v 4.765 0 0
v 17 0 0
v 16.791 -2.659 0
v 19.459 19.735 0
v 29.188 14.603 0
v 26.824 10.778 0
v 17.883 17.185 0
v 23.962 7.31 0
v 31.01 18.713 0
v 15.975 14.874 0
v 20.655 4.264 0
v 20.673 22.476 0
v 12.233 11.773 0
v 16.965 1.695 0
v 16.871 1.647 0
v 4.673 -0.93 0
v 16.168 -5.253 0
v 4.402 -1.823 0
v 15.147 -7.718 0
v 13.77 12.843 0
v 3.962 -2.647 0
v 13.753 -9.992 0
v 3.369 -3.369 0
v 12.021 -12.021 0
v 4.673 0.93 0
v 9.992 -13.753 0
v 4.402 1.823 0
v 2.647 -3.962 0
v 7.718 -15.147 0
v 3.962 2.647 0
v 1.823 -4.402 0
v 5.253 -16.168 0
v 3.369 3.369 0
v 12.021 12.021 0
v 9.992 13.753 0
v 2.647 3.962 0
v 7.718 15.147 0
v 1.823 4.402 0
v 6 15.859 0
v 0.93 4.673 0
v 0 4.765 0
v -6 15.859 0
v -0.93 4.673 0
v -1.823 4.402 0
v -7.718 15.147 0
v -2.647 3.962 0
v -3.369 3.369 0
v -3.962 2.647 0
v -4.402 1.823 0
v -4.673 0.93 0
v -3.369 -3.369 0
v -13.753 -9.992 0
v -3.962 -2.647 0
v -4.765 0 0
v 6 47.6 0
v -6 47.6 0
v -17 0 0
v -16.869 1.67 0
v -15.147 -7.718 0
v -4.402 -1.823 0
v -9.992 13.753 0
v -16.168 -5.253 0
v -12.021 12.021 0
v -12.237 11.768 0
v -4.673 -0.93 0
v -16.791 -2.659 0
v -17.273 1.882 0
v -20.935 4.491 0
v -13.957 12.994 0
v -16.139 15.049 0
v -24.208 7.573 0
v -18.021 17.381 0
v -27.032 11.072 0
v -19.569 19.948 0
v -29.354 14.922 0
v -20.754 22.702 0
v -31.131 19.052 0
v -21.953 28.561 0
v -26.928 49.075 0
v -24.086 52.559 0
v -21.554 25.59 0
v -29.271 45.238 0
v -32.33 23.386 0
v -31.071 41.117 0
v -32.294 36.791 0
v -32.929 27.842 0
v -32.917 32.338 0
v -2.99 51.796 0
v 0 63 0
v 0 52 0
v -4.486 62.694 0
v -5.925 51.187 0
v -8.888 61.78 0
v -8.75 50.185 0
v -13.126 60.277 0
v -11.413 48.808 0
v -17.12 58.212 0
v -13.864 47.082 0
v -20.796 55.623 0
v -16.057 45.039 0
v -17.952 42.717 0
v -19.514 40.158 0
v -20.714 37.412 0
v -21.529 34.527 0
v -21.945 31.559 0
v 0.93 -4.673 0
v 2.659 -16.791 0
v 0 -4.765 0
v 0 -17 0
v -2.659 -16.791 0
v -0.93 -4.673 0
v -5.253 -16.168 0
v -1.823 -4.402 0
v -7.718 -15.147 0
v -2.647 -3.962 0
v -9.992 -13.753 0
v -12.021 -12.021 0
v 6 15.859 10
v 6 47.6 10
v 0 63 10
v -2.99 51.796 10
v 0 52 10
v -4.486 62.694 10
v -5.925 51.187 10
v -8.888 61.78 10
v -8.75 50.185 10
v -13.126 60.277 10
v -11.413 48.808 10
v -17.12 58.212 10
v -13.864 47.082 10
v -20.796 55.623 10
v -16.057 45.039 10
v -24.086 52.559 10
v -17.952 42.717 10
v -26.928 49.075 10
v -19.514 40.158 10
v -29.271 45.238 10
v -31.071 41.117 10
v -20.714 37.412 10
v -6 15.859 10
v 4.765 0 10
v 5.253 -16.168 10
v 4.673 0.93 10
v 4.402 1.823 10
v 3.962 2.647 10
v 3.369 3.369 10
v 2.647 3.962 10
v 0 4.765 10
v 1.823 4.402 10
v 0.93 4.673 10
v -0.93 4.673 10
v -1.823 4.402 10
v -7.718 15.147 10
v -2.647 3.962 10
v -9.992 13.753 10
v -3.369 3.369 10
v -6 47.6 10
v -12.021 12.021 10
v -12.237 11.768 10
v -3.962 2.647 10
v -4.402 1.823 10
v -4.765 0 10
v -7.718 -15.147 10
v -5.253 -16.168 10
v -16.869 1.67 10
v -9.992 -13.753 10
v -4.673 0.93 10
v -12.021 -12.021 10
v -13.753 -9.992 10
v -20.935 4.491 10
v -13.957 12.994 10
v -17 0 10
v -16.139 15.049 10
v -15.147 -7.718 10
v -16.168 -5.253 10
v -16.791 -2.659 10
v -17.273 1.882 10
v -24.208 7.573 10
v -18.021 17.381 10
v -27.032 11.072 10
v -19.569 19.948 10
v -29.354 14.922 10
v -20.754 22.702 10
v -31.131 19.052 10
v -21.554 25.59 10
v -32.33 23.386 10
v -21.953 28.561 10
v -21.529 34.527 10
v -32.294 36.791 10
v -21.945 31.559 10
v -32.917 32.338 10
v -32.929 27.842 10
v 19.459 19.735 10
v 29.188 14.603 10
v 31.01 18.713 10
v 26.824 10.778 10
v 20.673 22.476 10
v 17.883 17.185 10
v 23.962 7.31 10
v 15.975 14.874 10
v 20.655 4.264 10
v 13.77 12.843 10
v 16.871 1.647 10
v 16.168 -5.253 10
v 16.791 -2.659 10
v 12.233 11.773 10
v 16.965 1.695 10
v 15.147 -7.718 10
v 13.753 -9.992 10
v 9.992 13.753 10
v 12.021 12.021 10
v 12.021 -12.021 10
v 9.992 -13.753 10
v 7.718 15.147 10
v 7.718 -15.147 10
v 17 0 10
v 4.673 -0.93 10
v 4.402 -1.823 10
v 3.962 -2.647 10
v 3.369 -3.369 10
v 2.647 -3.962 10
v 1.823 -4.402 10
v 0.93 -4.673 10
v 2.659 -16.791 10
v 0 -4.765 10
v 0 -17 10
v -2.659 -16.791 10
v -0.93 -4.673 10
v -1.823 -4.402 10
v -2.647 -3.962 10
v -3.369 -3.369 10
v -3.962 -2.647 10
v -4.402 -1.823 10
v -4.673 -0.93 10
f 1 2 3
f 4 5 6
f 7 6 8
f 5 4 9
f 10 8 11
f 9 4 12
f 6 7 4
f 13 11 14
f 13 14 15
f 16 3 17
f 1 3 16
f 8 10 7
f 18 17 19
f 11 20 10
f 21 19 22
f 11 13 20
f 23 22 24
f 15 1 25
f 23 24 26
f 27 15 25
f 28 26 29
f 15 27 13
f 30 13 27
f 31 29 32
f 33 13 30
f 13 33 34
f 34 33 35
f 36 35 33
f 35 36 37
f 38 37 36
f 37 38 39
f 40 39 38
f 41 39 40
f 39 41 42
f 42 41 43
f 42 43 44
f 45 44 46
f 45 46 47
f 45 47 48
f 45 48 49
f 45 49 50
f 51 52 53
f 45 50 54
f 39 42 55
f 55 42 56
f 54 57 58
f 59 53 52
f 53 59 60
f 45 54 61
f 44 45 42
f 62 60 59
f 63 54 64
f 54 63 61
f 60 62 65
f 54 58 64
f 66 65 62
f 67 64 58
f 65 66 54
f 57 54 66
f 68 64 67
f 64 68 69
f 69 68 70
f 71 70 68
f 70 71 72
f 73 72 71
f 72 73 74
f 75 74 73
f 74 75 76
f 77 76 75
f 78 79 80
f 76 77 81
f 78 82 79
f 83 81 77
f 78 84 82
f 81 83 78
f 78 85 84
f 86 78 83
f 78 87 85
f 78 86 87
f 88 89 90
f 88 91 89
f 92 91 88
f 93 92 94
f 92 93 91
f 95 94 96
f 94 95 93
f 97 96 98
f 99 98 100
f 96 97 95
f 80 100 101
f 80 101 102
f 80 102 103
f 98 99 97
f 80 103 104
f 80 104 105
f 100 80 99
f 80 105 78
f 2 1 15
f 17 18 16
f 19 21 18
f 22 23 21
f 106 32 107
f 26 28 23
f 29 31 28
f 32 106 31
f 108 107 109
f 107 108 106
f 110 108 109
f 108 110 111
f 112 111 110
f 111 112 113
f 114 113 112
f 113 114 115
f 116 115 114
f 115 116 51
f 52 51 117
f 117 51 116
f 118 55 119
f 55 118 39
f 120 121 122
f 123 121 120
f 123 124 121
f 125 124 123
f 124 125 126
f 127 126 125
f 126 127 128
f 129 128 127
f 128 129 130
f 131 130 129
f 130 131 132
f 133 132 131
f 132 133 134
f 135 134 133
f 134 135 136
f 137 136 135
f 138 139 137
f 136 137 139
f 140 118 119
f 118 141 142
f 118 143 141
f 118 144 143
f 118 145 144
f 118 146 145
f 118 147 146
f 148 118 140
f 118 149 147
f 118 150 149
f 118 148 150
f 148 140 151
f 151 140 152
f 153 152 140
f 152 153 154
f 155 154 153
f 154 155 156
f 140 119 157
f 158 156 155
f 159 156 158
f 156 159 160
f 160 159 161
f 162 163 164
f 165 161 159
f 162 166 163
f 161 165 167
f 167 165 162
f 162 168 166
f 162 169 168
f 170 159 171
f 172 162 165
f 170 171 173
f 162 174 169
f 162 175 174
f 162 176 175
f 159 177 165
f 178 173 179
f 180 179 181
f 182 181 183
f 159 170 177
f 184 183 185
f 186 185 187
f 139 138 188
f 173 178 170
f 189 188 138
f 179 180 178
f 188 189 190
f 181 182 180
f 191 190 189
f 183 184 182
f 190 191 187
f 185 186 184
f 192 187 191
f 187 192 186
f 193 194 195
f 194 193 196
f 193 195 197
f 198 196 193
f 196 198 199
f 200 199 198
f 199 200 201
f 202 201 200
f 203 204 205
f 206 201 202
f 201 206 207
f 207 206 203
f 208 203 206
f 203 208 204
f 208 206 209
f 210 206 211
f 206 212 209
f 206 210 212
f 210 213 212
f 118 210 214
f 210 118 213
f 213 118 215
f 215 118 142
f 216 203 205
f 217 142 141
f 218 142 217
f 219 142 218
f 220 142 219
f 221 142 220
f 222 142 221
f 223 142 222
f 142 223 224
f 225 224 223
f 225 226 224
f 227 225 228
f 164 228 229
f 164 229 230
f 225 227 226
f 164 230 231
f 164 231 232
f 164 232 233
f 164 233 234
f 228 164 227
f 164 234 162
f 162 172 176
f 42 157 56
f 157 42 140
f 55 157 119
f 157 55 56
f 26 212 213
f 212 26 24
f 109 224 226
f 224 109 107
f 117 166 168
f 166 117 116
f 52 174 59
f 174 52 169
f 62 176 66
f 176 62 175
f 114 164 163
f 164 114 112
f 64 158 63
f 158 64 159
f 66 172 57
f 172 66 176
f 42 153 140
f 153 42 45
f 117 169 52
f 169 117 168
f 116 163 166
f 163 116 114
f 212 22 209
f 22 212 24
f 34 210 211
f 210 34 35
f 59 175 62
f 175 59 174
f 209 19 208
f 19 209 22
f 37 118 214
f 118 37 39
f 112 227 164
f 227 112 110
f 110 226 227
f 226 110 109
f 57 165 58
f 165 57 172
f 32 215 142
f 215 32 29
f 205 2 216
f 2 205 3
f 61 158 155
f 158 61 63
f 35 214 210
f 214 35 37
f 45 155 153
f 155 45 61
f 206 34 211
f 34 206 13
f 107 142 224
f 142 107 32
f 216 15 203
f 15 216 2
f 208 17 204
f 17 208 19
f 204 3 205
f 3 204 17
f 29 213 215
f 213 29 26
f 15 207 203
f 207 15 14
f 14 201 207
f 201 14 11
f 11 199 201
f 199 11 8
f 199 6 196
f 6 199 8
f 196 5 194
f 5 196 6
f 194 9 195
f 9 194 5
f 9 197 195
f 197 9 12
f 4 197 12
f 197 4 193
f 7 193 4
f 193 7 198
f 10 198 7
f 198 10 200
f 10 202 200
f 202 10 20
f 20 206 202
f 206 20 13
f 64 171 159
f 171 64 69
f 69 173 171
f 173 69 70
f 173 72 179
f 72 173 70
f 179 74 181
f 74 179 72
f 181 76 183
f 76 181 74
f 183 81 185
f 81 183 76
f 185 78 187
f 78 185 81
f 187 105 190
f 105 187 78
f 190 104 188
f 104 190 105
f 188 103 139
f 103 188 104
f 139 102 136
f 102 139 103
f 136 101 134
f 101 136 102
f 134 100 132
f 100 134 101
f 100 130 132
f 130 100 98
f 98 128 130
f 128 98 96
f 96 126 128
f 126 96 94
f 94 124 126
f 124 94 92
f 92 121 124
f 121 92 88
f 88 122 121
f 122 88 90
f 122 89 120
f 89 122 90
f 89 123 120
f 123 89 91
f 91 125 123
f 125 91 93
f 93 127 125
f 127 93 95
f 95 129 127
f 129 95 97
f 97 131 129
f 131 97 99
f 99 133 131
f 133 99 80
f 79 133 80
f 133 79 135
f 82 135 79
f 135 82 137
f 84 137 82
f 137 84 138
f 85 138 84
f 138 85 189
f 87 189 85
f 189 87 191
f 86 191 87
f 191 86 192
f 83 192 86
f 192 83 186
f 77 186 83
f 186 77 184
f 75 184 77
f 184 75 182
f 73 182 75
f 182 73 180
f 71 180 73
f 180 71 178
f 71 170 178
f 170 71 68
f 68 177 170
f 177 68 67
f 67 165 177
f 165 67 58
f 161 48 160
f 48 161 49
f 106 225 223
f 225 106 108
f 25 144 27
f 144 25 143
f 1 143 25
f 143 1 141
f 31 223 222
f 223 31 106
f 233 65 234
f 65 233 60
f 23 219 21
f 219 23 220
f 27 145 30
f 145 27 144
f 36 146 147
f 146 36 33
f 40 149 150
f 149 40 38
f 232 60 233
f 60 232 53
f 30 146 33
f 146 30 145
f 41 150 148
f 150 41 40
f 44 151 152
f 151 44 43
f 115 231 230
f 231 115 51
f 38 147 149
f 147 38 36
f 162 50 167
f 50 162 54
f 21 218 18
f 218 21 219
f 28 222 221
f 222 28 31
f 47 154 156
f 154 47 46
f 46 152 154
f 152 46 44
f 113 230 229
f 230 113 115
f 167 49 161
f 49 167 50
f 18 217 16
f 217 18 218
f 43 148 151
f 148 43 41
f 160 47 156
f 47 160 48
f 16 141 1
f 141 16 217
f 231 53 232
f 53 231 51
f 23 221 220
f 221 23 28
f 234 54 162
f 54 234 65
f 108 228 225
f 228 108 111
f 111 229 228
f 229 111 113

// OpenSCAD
$fn = 32;

// ----------------------------------------------------------------------
// Hook: 60 mm shank into a 22 mm curl, 10 mm thick
// ----------------------------------------------------------------------

// --- parameters (mm) ---
shank_len = 60;           // shank length from the boss centre
shank_w = 12;             // shank width
boss_d = 34;              // boss diameter
bore_d = 9.53;            // boss bore
curl_in = 22;             // curl inner radius
curl_out = 33;            // curl outer radius
curl_sweep = 250;         // curl sweep angle
hook_t = 10;              // hook thickness

shank_profile = [[-6, 47.6], [6, 47.6], [6, 15], [-6, 15]];
boss_profile = [[17, 0], [16.791, 2.659], [16.168, 5.253], [15.147, 7.718], [13.753, 9.992], [12.021, 12.021], [9.992, 13.753], [7.718, 15.147], [5.253, 16.168], [2.659, 16.791], [0, 17], [-2.659, 16.791], [-5.253, 16.168], [-7.718, 15.147], [-9.992, 13.753], [-12.021, 12.021], [-13.753, 9.992], [-15.147, 7.718], [-16.168, 5.253], [-16.791, 2.659], [-17, 0], [-16.791, -2.659], [-16.168, -5.253], [-15.147, -7.718], [-13.753, -9.992], [-12.021, -12.021], [-9.992, -13.753], [-7.718, -15.147], [-5.253, -16.168], [-2.659, -16.791], [0, -17], [2.659, -16.791], [5.253, -16.168], [7.718, -15.147], [9.992, -13.753], [12.021, -12.021], [13.753, -9.992], [15.147, -7.718], [16.168, -5.253], [16.791, -2.659]];
curl_profile = [[0, 63], [-4.486, 62.694], [-8.888, 61.78], [-13.126, 60.277], [-17.12, 58.212], [-20.796, 55.623], [-24.086, 52.559], [-26.928, 49.075], [-29.271, 45.238], [-31.071, 41.117], [-32.294, 36.791], [-32.917, 32.338], [-32.929, 27.842], [-32.33, 23.386], [-31.131, 19.052], [-29.354, 14.922], [-27.032, 11.072], [-24.208, 7.573], [-20.935, 4.491], [-17.273, 1.882], [-13.291, -0.205], [-9.061, -1.732], [-4.664, -2.669], [-0.18, -3], [4.307, -2.718], [8.715, -1.828], [12.96, -0.348], [16.965, 1.695], [20.655, 4.264], [23.962, 7.31], [26.824, 10.778], [29.188, 14.603], [31.01, 18.713], [20.673, 22.476], [19.459, 19.735], [17.883, 17.185], [15.975, 14.874], [13.77, 12.843], [11.31, 11.13], [8.64, 9.768], [5.81, 8.781], [2.872, 8.188], [-0.12, 8], [-3.109, 8.221], [-6.041, 8.846], [-8.86, 9.863], [-11.515, 11.254], [-13.957, 12.994], [-16.139, 15.049], [-18.021, 17.381], [-19.569, 19.948], [-20.754, 22.702], [-21.554, 25.59], [-21.953, 28.561], [-21.945, 31.559], [-21.529, 34.527], [-20.714, 37.412], [-19.514, 40.158], [-17.952, 42.717], [-16.057, 45.039], [-13.864, 47.082], [-11.413, 48.808], [-8.75, 50.185], [-5.925, 51.187], [-2.99, 51.796], [0, 52]];

difference() {
  union() {
    /* three overlapping outlines: shank, boss and the smooth curl */
    linear_extrude(height = hook_t) polygon(shank_profile);
    linear_extrude(height = hook_t) polygon(boss_profile);
    linear_extrude(height = hook_t) polygon(curl_profile);
  }
  translate([0, 0, -2.5]) cylinder(h = hook_t + 5, d = bore_d);
}
